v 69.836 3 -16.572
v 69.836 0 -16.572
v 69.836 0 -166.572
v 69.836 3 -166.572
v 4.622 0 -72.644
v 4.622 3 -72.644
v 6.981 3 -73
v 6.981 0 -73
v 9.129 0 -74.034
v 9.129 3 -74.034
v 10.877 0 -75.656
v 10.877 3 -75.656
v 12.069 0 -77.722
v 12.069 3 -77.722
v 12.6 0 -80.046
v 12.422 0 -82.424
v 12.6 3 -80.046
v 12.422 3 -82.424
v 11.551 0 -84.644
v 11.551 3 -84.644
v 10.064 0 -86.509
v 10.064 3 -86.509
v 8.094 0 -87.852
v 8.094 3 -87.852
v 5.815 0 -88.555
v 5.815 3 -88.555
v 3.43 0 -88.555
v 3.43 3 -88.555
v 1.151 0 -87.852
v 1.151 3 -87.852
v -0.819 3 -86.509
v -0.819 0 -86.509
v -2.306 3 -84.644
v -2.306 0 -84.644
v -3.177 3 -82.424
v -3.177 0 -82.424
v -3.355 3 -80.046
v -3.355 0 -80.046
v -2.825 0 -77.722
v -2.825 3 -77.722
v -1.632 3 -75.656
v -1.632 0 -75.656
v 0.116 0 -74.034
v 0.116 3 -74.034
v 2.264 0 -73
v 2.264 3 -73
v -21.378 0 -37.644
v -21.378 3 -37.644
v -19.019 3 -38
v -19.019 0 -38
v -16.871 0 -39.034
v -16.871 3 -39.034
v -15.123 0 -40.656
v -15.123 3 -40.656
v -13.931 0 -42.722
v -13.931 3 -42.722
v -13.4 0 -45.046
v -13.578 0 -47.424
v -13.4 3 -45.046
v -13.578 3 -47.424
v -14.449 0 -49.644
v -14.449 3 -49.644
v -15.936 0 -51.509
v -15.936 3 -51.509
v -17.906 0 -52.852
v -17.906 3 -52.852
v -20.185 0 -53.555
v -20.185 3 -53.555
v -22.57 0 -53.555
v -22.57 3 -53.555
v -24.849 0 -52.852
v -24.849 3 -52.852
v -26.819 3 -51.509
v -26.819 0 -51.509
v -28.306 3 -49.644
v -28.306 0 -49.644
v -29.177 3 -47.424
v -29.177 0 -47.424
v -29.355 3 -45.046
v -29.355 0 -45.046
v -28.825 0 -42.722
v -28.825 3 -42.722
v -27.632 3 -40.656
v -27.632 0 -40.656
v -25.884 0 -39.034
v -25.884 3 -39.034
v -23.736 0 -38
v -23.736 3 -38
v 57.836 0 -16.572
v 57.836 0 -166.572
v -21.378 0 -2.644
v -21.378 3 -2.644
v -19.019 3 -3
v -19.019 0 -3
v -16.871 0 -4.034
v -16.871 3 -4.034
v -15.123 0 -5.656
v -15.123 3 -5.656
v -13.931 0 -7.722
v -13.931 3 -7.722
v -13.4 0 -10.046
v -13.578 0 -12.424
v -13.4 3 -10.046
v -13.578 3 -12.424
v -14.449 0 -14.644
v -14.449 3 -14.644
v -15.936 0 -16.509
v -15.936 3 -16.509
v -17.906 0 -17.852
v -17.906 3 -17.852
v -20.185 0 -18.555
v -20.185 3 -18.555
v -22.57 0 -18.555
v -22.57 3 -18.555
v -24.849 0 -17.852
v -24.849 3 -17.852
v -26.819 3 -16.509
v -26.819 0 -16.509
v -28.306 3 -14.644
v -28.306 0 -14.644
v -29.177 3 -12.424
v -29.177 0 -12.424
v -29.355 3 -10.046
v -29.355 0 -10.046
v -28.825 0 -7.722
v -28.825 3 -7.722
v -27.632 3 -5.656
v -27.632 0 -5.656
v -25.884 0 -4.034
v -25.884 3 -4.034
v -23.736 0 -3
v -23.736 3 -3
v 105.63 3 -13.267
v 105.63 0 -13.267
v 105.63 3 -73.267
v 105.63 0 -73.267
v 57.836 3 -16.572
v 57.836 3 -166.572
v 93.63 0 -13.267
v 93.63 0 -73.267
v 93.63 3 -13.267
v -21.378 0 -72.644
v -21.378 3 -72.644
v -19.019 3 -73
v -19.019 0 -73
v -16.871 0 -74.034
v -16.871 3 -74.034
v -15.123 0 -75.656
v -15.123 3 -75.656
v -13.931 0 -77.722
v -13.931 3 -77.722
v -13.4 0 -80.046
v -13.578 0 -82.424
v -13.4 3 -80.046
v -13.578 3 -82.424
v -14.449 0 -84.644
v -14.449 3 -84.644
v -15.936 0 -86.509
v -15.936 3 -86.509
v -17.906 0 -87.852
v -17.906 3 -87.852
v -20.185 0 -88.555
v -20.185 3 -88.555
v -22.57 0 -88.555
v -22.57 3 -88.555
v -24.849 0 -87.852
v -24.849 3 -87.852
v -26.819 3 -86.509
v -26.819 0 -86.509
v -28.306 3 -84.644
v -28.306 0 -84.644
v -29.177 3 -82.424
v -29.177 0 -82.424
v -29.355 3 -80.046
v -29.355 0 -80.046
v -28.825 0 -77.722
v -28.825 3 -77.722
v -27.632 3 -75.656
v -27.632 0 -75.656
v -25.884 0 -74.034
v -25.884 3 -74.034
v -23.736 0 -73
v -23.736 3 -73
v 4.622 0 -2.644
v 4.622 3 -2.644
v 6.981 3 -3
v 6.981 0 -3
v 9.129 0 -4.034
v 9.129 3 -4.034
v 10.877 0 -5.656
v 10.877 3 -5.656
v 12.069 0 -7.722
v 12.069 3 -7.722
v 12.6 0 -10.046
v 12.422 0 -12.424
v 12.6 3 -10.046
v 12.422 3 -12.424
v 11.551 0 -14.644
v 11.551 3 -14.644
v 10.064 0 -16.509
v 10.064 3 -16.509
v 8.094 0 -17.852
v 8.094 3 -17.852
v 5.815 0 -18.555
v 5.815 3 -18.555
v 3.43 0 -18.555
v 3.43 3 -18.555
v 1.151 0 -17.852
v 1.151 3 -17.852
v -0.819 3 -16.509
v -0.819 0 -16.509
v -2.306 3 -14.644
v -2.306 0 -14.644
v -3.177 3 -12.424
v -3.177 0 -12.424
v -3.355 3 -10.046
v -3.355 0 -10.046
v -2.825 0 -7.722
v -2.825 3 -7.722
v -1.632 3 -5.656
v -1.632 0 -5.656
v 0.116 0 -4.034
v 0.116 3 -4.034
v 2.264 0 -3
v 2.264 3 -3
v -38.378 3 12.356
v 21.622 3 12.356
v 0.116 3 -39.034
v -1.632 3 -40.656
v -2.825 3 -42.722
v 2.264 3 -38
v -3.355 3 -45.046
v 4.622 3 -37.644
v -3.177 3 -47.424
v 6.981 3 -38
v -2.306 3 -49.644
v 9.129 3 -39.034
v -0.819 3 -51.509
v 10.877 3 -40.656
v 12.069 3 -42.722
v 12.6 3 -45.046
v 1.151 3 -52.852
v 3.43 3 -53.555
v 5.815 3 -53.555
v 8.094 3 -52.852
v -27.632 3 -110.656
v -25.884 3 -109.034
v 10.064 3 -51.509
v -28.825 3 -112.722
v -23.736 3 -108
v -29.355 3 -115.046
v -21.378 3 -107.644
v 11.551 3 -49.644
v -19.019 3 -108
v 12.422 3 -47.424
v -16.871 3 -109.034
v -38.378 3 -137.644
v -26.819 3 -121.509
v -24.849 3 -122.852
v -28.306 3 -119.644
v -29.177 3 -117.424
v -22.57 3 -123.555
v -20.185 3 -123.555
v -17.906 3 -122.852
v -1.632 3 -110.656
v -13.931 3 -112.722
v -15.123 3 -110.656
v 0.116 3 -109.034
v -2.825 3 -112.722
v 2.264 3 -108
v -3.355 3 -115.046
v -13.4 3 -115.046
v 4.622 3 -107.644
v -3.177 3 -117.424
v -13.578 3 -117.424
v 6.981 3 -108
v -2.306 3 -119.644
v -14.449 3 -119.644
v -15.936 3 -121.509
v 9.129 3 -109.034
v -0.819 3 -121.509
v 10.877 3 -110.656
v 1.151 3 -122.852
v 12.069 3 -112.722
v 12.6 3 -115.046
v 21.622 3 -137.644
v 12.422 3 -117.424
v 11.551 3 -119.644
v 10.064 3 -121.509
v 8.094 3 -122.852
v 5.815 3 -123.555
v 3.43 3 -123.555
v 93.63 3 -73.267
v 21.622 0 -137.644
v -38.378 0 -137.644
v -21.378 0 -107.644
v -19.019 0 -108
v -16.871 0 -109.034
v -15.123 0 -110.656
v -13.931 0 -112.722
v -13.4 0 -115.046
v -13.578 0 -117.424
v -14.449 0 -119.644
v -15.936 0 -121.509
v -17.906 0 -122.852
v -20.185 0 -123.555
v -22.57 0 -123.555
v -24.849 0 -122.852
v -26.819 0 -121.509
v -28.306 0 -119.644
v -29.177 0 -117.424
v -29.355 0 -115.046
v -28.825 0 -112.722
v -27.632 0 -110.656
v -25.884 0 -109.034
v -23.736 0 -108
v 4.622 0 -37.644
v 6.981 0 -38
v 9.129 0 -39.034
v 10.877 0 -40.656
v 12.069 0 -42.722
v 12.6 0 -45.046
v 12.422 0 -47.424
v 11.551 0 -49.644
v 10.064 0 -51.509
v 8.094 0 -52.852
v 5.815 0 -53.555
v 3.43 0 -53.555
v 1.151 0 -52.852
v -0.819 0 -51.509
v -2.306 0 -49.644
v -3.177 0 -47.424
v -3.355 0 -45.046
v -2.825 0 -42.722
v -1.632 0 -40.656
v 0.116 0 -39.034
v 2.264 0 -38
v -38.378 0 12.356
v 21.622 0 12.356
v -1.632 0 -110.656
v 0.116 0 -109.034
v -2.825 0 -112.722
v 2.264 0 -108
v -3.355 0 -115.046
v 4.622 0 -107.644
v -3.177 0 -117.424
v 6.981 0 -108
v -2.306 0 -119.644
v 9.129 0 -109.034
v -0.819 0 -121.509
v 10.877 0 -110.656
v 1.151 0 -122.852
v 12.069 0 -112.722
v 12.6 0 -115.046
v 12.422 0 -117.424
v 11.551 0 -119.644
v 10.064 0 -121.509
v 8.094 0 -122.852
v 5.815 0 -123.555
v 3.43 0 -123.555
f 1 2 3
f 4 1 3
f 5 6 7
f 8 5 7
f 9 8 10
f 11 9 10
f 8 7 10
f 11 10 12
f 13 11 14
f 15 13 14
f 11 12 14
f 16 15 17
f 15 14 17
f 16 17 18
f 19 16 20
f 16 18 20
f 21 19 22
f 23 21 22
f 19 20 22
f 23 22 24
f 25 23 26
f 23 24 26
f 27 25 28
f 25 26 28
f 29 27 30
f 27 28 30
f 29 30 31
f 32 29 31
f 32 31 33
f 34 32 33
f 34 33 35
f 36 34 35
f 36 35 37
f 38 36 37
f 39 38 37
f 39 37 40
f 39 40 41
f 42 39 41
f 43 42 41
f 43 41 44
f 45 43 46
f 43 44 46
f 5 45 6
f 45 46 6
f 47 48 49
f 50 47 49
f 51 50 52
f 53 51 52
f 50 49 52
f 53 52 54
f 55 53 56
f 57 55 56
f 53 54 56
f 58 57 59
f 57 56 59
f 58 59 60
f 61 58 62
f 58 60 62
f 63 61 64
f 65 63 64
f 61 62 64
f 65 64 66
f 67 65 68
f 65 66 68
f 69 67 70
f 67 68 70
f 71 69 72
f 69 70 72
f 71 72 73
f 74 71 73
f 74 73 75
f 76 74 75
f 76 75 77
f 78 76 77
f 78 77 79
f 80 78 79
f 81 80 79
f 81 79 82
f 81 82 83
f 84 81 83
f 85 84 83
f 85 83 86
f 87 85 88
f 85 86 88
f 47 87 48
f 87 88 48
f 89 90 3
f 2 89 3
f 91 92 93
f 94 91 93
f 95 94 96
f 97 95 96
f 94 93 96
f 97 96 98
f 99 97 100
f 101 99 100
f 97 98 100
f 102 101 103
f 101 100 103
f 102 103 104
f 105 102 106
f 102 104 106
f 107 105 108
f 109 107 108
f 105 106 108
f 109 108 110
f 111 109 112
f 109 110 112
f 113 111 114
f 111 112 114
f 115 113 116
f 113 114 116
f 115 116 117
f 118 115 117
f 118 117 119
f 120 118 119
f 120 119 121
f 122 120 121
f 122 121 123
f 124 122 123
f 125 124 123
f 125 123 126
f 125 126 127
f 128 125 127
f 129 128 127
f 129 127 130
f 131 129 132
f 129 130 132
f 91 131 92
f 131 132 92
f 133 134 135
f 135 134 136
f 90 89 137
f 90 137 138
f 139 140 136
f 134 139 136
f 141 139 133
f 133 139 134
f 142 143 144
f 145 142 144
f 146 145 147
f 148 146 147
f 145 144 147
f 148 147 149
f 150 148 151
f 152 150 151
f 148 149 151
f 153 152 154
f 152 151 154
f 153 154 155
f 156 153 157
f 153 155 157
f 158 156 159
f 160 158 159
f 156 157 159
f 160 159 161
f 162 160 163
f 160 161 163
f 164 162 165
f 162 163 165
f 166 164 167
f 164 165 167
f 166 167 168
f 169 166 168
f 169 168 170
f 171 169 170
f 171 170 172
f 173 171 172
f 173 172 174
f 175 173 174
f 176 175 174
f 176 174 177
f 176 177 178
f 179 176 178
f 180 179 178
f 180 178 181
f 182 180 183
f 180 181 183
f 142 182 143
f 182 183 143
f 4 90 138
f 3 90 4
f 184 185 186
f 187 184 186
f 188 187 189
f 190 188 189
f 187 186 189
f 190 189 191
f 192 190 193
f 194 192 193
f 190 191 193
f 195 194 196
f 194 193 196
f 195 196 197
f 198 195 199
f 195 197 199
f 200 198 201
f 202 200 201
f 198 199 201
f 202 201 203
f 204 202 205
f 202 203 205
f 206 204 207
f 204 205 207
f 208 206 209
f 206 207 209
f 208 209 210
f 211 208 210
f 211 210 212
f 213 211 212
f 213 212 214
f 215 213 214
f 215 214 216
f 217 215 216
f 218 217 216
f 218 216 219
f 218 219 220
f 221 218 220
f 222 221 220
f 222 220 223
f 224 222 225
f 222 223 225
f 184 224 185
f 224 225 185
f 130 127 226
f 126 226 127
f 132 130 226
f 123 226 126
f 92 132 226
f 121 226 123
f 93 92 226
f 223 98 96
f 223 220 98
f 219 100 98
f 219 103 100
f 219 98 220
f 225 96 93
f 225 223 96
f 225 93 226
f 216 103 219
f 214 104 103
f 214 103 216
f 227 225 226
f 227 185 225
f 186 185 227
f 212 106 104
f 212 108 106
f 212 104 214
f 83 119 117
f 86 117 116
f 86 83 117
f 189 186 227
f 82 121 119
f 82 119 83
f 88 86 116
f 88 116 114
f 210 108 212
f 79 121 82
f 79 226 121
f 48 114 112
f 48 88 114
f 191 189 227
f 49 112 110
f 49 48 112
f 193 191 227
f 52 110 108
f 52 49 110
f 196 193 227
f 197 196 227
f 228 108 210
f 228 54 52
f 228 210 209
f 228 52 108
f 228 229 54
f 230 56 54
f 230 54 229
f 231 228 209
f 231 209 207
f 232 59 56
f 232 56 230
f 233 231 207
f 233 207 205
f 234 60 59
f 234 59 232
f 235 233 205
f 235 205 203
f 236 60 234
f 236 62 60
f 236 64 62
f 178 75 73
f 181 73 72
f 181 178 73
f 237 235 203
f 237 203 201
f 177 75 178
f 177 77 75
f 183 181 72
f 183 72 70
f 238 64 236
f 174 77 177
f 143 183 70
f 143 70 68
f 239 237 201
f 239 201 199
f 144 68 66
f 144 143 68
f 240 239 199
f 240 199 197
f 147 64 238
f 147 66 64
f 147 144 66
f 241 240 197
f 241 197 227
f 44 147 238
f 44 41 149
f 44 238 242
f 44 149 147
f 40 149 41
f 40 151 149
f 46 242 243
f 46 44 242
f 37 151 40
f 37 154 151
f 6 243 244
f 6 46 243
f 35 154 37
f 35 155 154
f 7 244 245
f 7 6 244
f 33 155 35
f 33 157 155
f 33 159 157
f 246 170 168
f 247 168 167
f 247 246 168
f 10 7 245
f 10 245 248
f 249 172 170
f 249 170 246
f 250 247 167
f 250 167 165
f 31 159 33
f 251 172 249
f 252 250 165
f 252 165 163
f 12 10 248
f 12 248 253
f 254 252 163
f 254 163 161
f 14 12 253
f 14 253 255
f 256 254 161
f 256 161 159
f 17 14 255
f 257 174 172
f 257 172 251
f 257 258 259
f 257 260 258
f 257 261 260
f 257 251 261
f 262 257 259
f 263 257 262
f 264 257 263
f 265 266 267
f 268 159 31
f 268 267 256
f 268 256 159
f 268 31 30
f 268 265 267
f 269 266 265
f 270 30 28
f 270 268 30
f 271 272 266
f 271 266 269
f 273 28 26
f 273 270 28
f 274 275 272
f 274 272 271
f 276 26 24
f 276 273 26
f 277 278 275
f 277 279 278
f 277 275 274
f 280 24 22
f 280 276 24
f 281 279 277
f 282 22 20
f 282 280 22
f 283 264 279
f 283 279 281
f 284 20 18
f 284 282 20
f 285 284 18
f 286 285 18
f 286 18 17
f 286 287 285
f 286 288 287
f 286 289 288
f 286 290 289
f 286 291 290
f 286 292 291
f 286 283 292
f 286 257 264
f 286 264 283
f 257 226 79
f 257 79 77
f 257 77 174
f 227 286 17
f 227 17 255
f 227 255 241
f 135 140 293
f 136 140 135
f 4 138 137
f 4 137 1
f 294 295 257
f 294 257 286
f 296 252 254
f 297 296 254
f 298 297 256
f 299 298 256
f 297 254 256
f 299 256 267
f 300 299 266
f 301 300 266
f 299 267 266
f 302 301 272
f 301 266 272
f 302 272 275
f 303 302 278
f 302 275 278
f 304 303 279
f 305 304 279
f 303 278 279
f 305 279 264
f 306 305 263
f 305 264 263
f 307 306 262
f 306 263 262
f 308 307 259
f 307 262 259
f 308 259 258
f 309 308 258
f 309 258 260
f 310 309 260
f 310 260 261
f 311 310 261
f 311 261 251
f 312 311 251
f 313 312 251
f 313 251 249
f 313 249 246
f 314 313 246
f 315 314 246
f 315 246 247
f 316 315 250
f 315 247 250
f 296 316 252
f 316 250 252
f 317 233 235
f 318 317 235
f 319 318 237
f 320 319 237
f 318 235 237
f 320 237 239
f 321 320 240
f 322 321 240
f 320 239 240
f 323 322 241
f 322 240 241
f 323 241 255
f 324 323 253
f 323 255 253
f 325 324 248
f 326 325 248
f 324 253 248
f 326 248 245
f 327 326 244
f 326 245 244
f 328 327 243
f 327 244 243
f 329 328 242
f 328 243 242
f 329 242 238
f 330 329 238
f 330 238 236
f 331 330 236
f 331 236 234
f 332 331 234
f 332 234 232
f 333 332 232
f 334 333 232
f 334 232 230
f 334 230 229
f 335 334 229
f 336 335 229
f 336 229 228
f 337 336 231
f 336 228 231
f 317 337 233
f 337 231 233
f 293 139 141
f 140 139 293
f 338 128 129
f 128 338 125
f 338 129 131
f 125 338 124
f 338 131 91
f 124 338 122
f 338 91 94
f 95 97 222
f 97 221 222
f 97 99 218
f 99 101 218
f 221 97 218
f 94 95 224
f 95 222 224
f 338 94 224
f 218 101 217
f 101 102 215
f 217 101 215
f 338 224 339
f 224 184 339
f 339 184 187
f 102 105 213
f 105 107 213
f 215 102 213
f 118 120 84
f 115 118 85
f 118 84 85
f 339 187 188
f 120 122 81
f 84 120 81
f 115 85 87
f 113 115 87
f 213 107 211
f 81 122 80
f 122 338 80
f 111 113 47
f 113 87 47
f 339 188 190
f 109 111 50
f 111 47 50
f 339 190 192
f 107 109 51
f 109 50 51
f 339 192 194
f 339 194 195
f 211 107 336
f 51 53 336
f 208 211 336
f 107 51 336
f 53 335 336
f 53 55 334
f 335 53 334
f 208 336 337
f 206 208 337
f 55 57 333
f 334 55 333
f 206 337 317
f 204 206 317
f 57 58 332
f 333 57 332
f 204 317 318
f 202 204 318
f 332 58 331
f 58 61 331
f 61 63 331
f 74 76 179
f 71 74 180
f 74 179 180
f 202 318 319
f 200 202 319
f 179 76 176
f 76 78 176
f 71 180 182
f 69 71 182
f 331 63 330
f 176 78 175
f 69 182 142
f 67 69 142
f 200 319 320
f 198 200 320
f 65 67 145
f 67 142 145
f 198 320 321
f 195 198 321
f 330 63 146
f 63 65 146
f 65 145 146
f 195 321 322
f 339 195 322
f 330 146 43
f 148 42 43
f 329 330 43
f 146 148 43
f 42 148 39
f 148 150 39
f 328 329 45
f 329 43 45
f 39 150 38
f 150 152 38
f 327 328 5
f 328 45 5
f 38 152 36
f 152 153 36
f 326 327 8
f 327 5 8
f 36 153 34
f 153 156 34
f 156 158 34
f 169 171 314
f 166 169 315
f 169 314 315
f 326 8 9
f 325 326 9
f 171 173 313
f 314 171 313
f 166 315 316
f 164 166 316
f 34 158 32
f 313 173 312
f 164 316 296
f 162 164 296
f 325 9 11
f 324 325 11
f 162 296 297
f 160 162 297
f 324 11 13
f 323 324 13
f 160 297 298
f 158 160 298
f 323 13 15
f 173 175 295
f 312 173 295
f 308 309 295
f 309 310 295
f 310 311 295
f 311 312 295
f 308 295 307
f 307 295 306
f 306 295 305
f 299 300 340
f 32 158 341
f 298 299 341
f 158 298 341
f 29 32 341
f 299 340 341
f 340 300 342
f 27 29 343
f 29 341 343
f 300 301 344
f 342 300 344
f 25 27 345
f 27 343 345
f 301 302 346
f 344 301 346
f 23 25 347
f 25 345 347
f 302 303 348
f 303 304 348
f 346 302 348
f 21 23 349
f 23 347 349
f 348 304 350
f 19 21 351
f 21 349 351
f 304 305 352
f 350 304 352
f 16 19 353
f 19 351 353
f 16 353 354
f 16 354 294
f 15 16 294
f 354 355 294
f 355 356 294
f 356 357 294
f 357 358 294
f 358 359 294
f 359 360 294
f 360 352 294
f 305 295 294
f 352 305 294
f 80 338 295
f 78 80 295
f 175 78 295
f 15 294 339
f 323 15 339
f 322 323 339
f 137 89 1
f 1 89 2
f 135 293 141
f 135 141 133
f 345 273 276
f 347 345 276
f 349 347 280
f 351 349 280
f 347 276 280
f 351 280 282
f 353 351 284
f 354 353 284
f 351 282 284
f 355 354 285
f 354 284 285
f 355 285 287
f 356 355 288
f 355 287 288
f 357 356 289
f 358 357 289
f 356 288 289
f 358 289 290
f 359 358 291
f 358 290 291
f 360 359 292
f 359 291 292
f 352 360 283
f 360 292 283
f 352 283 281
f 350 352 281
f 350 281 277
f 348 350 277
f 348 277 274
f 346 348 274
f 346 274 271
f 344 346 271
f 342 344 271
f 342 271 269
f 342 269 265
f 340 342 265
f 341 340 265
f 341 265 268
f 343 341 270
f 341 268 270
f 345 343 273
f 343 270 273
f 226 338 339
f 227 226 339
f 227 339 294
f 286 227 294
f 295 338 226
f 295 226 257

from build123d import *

# Parameters (mm, degrees)
SKETCH1_W           = 60
SKETCH1_H           = 150
BOSS_EXTRUDE2_DEPTH = 3
SKETCH2_W           = 12
SKETCH2_H           = 150
BOSS_EXTRUDE4_DEPTH = 3
SKETCH3_W           = 12
SKETCH3_H           = 60
BOSS_EXTRUDE5_DEPTH = 3
SKETCH4_R           = 8
CUT_EXTRUDE1_DEPTH  = 3


with BuildPart() as part:
    # Sketch1 → Boss-Extrude2 (new body)
    with BuildSketch(Plane(origin=(0, 0, 0), x_dir=(1, 0, 0), z_dir=(0, 1, 0))):
        with Locations((-8.377535101, 62.644305772)):
            Rectangle(SKETCH1_W, SKETCH1_H)
    extrude(amount=BOSS_EXTRUDE2_DEPTH)

    # Sketch4 → Cut-Extrude1 (cut)
    with BuildSketch(Plane(origin=(0, 3, 0), x_dir=(1, 0, 0), z_dir=(0, 1, 0))):
        with Locations(Location((4.622464899, 10.644305772, 0), (0, 0, 270))):
            Circle(SKETCH4_R)
        with Locations(Location((-21.377535101, 10.644305772, 0), (0, 0, 270))):
            Circle(SKETCH4_R)
        with Locations(Location((4.622464899, 45.644305772, 0), (0, 0, 270))):
            Circle(SKETCH4_R)
        with Locations(Location((-21.377535101, 45.644305772, 0), (0, 0, 270))):
            Circle(SKETCH4_R)
        with Locations(Location((4.622464899, 80.644305772, 0), (0, 0, 270))):
            Circle(SKETCH4_R)
        with Locations(Location((-21.377535101, 80.644305772, 0), (0, 0, 270))):
            Circle(SKETCH4_R)
        with Locations(Location((4.622464899, 115.644305772, 0), (0, 0, 270))):
            Circle(SKETCH4_R)
        with Locations(Location((-21.377535101, 115.644305772, 0), (0, 0, 270))):
            Circle(SKETCH4_R)
    extrude(amount=-CUT_EXTRUDE1_DEPTH, mode=Mode.SUBTRACT)


with BuildPart() as body_2:
    # Sketch2 → Boss-Extrude4 (new body)
    with BuildSketch(Plane(origin=(0, 0, 0), x_dir=(1, 0, 0), z_dir=(0, 1, 0))):
        with Locations((63.836257857, 91.57184727)):
            Rectangle(SKETCH2_W, SKETCH2_H)
    extrude(amount=BOSS_EXTRUDE4_DEPTH)


with BuildPart() as body_3:
    # Sketch3 → Boss-Extrude5 (new body)
    with BuildSketch(Plane(origin=(0, 0, 0), x_dir=(1, 0, 0), z_dir=(0, 1, 0))):
        with Locations((99.629560174, 43.26681982)):
            Rectangle(SKETCH3_W, SKETCH3_H)
    extrude(amount=BOSS_EXTRUDE5_DEPTH)


solid = Compound([part.part, body_2.part, body_3.part])
